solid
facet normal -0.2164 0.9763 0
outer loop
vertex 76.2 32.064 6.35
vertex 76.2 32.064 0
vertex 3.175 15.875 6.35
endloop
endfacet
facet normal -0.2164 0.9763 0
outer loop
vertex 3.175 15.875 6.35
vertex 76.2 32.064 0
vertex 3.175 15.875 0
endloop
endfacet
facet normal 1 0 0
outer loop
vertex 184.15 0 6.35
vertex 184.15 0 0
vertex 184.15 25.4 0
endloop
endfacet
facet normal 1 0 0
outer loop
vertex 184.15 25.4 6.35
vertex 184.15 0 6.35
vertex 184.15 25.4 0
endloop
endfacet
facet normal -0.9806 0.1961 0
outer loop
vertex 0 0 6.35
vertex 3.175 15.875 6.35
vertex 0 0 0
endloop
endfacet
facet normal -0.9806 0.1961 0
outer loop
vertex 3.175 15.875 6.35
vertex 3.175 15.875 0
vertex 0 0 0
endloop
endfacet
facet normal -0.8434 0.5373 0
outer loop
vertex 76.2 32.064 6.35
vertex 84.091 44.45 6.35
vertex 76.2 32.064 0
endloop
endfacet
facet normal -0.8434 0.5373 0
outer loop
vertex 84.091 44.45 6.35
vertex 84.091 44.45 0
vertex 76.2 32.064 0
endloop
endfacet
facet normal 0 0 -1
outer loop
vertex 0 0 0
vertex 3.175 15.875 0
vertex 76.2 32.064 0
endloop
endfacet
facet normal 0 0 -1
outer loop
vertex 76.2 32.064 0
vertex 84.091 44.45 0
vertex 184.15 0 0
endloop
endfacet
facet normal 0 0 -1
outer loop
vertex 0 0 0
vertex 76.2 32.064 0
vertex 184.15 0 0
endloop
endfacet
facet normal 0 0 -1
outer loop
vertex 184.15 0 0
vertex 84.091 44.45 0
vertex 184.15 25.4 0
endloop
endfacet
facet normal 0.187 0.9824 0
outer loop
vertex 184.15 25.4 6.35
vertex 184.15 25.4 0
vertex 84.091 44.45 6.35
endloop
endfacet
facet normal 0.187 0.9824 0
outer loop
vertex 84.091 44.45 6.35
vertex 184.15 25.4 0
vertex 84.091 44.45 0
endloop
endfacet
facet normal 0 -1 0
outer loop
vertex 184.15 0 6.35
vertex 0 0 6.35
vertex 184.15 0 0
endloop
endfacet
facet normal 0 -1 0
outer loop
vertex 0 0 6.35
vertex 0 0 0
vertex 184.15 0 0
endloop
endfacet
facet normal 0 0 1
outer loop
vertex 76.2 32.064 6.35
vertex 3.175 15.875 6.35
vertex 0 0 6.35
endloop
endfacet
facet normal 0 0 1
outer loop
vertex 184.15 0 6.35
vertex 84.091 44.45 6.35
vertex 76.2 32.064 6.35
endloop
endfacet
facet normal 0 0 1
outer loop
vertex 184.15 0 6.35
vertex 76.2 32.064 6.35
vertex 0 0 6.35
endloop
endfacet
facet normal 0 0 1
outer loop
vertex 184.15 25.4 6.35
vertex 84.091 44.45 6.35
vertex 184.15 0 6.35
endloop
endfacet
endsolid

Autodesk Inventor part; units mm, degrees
ref_plane "YZ Plane" through (0, 0, 0) normal (1, 0, 0) x (0, 1, 0)
ref_plane "XZ Plane" through (0, 0, 0) normal (0, 1, 0) x (-1, 0, 0)
ref_plane "XY Plane" through (0, 0, 0) normal (0, 0, 1) x (1, 0, 0)
sketch "Sketch1" plane through (0, 0, 0) normal (0, 0, 1) x (1, 0, 0)
  line L0 (0, 0) -> (184.15, 0)
  line L1 (84.0906, 44.45) -> (76.2, 32.0643)
  line L2 (76.2, 32.0643) -> (3.175, 15.875)
  line L3 (3.175, 15.875) -> (0, 0)
  circle A0 centre (0, 0) radius 190.5 construction
  line L4 (0, 0) -> (0, 190.5) construction
  line L5 (184.15, 0) -> (184.15, 25.4)
  line L6 (184.15, 25.4) -> (84.0906, 44.45)
  circle A1 centre (95.25, 12.7) radius 12
  dimension "d3" = 381
  dimension "d0" = 184.15
  dimension "d1" = 3.175
  dimension "d2" = 15.875
  dimension "d4" = 12.5
  dimension "d5" = 76.2
  dimension "d6" = 44.45
  dimension "d12" = 135
  dimension "d13" = 25.4
  dimension "d15" = 24
  dimension "d16" = 88.9
  dimension "d17" = 12.7
extrude "Extrusion1" add sketch "Sketch1" along normal blind 6.35 contours L3 L2 L1 L6 L5 L0 | A1
properties part number "Side_Blocker" material "UHMW, White"
